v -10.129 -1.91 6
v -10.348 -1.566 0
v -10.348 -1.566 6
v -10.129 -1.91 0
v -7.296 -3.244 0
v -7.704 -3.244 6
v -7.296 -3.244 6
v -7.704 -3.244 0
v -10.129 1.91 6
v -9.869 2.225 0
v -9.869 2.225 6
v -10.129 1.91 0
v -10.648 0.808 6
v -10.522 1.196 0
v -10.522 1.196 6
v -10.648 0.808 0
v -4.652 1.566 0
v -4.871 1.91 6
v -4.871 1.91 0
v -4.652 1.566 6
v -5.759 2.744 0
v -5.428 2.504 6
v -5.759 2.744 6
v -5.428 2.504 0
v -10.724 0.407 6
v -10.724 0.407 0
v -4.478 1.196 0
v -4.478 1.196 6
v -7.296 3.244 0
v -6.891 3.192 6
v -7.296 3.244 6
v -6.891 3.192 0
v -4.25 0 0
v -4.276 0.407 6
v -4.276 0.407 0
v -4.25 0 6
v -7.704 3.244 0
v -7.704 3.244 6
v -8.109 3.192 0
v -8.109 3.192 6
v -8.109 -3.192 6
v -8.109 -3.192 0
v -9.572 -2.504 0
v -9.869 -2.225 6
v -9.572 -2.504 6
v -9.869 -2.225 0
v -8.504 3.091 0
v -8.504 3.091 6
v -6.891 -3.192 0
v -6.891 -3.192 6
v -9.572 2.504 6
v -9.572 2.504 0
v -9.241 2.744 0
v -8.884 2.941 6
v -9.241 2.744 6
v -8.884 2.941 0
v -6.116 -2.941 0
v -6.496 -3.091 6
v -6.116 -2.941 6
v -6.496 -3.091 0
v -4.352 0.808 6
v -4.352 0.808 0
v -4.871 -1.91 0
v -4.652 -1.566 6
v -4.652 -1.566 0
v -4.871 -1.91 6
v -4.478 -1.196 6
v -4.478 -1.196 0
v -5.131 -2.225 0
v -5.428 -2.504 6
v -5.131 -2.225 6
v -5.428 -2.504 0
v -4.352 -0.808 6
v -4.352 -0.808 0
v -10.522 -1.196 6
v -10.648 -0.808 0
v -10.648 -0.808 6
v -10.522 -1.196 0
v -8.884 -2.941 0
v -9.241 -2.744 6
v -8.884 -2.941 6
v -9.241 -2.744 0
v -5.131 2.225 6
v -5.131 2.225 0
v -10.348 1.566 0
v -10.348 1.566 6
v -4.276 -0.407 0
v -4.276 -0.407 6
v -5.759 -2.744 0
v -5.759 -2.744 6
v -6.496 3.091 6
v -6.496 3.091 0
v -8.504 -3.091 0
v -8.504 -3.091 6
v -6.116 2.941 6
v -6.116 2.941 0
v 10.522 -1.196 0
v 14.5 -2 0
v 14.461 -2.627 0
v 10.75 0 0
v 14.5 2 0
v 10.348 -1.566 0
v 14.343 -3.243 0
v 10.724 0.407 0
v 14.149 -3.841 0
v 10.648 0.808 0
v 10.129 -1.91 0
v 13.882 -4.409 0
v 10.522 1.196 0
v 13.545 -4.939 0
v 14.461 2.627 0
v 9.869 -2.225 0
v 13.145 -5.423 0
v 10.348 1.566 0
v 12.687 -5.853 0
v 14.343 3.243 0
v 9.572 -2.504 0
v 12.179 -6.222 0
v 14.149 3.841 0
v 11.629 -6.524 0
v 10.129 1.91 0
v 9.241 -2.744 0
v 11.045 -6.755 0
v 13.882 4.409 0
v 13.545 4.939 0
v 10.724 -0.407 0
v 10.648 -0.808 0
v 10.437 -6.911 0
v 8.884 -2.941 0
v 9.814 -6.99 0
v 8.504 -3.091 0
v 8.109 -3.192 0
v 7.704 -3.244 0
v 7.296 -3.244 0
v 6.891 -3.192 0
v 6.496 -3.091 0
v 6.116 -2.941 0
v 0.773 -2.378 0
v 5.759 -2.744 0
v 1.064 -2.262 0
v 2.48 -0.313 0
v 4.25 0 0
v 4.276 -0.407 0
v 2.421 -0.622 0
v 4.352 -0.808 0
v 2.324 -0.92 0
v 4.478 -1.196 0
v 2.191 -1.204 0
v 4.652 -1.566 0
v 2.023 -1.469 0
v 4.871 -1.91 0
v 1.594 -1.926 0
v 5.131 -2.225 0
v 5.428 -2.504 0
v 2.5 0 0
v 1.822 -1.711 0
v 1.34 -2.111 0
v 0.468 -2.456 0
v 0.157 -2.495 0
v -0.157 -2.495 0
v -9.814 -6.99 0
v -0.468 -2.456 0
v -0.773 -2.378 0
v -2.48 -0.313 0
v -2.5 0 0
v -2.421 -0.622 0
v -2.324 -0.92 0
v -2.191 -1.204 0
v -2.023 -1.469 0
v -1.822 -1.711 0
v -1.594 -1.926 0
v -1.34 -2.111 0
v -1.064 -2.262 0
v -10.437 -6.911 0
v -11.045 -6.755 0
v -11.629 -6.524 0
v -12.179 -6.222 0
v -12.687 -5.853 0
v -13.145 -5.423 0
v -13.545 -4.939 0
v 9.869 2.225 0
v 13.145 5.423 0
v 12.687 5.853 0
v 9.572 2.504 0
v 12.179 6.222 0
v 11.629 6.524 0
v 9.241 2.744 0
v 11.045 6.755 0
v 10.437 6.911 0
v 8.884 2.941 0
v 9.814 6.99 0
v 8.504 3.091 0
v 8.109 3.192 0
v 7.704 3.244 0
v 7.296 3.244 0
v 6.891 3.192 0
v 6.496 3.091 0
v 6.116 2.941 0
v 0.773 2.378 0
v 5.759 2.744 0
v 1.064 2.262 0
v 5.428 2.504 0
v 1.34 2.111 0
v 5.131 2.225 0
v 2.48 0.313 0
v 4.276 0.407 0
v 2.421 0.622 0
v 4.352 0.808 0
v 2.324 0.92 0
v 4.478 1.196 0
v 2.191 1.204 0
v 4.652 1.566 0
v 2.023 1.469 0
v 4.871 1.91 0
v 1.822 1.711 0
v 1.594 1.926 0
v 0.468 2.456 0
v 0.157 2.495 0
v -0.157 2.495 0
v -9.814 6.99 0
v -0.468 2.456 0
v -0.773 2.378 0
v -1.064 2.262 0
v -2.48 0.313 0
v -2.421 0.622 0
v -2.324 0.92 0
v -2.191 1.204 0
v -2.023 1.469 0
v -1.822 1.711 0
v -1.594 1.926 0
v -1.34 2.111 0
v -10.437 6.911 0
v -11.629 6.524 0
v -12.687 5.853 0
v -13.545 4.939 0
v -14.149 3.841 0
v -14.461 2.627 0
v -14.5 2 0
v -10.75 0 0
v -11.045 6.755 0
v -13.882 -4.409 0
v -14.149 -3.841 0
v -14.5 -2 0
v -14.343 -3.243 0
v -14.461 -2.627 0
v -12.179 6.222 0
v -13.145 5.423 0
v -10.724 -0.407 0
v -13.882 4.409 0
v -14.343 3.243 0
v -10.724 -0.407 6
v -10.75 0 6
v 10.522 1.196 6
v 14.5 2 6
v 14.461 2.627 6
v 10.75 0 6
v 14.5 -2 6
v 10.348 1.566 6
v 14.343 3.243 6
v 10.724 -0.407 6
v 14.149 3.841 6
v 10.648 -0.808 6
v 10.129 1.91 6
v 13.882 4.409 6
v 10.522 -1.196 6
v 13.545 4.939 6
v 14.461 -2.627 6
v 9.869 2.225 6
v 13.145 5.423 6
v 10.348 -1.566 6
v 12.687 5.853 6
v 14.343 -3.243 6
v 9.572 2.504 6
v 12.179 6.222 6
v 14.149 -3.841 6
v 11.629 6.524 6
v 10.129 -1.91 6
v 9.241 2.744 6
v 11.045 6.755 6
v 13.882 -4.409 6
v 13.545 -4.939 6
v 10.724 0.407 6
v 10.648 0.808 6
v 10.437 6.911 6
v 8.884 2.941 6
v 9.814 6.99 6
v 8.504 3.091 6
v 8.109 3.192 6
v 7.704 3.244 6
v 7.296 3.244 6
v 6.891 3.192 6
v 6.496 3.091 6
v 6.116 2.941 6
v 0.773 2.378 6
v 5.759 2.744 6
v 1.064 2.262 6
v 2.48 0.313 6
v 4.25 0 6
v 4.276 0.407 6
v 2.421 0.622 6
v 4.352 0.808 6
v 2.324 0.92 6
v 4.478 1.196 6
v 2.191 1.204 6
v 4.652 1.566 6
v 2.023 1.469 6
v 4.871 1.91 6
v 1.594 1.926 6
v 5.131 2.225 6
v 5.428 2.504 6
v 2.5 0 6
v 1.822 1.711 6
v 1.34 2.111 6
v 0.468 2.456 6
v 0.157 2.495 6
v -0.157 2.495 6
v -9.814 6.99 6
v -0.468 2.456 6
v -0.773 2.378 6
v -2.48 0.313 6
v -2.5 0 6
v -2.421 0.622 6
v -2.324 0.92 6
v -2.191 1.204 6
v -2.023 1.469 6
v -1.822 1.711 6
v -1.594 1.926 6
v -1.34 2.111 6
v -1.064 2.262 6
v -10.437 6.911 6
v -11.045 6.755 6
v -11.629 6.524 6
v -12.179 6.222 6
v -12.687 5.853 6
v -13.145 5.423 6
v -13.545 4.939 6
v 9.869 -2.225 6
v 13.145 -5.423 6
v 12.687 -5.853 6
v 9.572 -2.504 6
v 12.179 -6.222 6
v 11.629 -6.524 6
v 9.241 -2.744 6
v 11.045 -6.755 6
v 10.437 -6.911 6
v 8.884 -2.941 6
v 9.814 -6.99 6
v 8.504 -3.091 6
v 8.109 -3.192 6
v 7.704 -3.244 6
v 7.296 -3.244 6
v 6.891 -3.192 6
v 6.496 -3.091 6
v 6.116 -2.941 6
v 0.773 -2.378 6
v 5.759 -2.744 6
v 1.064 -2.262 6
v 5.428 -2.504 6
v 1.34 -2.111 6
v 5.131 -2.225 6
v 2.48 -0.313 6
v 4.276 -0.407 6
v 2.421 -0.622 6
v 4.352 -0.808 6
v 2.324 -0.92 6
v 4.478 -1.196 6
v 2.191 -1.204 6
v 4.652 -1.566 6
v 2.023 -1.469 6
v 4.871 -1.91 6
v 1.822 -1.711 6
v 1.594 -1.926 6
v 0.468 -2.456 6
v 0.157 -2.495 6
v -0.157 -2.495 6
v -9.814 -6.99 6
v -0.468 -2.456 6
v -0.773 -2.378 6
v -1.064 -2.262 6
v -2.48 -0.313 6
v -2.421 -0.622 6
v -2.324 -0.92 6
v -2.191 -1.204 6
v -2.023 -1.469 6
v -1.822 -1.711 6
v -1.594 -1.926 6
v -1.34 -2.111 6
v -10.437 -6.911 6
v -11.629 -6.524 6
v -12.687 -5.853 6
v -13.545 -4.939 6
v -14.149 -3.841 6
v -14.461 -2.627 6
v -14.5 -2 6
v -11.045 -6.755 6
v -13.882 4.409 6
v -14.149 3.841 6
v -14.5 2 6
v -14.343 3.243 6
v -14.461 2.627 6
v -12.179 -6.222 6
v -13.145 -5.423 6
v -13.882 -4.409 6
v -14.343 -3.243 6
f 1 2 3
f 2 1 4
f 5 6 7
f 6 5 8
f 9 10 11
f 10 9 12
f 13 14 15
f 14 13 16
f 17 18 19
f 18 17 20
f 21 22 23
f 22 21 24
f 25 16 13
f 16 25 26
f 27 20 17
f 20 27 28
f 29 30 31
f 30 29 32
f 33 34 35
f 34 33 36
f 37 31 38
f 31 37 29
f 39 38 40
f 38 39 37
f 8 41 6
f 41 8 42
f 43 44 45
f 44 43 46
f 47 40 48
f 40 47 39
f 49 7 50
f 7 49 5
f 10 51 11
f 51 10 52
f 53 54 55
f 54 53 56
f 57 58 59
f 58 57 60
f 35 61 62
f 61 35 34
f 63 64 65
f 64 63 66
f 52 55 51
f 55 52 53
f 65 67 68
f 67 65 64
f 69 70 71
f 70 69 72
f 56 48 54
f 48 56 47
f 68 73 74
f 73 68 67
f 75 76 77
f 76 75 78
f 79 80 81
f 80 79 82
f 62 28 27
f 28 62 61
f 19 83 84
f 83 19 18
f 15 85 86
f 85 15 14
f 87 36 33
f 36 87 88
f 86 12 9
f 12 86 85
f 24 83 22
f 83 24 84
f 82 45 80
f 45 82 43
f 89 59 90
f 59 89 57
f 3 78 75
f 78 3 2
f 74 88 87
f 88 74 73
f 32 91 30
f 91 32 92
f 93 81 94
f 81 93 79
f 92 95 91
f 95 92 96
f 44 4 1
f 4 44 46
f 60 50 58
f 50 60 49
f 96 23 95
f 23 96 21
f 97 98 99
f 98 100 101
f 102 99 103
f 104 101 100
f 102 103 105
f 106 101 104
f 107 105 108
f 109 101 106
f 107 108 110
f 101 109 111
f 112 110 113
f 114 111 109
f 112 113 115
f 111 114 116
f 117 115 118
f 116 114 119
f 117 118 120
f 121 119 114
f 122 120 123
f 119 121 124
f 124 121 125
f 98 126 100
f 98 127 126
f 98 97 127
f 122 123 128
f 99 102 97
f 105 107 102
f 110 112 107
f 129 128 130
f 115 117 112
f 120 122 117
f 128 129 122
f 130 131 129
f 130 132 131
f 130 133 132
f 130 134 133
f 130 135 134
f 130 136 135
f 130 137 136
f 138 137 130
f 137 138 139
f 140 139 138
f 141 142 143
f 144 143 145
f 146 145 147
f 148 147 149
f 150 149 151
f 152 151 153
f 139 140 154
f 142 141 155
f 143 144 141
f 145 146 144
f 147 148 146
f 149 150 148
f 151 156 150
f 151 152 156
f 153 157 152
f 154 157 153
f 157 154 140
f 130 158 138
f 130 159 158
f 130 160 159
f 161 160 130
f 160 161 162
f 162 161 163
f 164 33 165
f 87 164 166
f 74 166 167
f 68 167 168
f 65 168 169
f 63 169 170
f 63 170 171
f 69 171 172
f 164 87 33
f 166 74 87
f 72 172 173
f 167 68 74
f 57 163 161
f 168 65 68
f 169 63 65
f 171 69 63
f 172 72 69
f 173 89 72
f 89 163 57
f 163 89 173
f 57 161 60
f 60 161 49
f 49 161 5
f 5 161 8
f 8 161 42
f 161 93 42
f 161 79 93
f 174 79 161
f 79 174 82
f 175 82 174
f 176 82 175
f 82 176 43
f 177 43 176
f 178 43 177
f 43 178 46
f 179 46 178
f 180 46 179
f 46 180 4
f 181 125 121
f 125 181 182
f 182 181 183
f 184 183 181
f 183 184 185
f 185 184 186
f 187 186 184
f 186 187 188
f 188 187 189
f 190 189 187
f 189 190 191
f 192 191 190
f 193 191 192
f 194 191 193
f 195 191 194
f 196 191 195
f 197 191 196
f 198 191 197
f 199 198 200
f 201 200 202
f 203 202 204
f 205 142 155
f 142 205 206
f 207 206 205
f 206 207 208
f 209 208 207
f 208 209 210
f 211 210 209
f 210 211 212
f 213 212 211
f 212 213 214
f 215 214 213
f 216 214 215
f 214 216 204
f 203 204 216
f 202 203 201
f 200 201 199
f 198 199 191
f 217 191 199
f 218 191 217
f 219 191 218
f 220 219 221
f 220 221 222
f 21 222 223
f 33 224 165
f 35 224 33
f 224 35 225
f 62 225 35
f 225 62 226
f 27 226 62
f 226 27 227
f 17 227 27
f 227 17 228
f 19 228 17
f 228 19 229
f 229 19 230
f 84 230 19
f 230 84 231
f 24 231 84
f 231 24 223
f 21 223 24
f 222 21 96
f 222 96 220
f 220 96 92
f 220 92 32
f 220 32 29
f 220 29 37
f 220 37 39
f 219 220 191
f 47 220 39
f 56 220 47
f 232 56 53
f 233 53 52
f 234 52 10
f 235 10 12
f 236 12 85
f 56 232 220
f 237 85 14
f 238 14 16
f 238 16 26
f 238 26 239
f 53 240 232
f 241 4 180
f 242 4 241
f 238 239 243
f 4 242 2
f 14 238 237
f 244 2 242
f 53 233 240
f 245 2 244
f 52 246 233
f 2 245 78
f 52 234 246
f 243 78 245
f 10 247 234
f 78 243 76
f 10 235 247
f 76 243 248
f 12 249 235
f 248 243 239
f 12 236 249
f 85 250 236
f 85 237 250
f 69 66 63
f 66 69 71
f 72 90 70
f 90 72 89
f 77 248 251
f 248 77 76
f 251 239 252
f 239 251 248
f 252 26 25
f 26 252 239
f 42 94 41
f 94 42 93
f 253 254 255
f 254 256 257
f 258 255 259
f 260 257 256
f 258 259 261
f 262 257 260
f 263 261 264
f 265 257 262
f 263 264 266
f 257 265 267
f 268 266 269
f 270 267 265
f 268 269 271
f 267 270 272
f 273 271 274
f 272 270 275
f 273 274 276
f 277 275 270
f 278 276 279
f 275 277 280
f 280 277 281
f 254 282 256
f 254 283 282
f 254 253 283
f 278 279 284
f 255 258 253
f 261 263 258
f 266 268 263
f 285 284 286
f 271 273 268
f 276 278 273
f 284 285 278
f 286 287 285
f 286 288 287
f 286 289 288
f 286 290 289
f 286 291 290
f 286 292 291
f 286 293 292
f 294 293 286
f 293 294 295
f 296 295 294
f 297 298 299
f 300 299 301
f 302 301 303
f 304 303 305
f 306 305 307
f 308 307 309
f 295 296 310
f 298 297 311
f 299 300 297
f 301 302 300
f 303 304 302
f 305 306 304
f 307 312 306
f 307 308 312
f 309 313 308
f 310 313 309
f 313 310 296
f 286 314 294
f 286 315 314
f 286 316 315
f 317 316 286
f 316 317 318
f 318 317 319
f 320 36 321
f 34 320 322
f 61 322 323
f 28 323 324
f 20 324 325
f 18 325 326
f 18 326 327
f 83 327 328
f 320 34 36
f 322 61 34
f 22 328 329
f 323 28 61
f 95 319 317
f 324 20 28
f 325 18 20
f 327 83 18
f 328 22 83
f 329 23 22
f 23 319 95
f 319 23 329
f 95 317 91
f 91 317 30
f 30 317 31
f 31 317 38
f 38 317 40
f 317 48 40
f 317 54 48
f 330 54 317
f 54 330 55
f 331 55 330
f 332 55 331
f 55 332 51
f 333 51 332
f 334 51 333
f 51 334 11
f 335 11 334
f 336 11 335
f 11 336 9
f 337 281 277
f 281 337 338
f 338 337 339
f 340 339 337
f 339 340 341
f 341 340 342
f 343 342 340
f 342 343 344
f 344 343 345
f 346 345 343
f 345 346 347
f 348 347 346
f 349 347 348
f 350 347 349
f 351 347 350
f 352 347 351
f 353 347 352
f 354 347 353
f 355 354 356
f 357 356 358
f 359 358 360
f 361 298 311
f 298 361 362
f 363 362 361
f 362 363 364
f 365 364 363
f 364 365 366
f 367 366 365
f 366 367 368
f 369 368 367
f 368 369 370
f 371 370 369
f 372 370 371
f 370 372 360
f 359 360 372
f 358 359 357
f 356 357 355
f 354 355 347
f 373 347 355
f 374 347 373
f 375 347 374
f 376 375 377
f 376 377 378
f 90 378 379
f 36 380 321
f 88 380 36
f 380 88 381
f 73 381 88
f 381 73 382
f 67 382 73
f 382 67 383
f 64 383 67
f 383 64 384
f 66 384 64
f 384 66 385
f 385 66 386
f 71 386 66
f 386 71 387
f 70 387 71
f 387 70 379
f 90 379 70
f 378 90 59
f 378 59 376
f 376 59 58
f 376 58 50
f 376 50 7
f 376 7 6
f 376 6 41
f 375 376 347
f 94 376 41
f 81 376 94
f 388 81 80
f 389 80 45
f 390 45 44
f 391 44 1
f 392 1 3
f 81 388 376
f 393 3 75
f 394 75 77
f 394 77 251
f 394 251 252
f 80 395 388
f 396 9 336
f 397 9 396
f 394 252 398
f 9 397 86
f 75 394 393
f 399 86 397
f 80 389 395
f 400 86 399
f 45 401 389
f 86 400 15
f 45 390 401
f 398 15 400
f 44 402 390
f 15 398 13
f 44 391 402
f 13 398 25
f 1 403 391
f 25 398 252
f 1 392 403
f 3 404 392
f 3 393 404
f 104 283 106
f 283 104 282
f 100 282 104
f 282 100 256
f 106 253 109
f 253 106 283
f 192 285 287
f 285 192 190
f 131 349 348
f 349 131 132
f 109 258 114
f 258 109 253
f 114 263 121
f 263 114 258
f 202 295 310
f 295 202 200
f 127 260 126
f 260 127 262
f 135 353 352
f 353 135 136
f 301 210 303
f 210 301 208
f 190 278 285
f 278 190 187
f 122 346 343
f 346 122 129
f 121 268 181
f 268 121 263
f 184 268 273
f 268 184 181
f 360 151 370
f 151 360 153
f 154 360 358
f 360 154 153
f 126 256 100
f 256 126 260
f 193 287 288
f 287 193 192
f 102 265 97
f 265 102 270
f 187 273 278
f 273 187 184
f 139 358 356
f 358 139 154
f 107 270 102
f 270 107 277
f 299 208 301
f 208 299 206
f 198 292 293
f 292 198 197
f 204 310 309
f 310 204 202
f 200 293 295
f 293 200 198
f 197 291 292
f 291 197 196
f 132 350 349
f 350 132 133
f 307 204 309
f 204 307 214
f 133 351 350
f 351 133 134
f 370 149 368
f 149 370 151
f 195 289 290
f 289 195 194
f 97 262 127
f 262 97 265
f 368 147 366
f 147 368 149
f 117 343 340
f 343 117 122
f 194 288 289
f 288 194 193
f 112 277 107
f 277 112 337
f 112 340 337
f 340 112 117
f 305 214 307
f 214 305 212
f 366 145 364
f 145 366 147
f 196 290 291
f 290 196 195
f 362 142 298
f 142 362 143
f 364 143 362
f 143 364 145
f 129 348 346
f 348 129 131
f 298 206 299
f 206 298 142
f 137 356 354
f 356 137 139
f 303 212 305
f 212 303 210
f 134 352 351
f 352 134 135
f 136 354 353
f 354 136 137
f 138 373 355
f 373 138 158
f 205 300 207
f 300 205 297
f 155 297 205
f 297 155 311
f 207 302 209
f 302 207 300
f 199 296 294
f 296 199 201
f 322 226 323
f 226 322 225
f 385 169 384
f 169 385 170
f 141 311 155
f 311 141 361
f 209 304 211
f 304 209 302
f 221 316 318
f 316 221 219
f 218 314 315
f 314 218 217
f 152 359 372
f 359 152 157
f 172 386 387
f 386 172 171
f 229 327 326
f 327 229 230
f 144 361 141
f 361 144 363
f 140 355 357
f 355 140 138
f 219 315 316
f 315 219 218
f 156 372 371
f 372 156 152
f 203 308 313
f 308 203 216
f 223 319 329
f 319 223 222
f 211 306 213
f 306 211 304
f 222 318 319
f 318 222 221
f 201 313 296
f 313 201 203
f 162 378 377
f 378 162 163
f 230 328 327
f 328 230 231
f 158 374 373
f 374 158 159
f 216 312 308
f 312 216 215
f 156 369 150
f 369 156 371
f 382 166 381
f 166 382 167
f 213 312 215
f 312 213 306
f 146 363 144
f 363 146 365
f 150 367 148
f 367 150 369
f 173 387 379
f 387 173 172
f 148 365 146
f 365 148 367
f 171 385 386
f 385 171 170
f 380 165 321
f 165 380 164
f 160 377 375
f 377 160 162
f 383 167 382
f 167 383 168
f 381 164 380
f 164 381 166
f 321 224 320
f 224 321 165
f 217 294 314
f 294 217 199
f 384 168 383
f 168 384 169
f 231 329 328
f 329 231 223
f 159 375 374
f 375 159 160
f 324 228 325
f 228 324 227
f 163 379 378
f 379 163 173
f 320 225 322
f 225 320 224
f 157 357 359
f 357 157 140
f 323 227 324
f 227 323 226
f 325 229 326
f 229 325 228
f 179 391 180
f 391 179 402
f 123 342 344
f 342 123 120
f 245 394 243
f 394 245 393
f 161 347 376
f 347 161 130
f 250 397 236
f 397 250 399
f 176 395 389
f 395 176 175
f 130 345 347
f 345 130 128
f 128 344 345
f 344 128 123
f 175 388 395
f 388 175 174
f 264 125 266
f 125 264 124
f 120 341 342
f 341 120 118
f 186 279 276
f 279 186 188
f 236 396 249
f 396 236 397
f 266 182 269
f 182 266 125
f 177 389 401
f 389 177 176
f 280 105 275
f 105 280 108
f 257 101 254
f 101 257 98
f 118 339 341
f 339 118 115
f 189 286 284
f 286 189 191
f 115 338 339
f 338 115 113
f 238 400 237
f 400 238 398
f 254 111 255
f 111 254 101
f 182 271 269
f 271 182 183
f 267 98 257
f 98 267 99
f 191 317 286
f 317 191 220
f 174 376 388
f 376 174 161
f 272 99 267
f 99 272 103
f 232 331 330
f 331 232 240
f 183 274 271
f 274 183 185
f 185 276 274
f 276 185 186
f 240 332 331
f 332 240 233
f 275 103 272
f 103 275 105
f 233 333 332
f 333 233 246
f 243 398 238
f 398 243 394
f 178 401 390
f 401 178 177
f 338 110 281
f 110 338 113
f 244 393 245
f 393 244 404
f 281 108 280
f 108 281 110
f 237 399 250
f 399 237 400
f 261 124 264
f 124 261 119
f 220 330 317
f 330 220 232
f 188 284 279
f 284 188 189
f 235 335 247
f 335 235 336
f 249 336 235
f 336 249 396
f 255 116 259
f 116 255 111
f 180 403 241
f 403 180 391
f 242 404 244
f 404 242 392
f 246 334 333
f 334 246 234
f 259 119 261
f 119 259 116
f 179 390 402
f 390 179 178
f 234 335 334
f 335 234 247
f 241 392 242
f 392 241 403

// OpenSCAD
$fn = 50;

difference() {
	union() {
		hull() {
			translate(v = [-9.5, 2.0, 0]) {
				cylinder(h = 6, r = 5);
			}
			translate(v = [9.5, 2.0, 0]) {
				cylinder(h = 6, r = 5);
			}
			translate(v = [-9.5, -2.0, 0]) {
				cylinder(h = 6, r = 5);
			}
			translate(v = [9.5, -2.0, 0]) {
				cylinder(h = 6, r = 5);
			}
		}
	}
	union() {
		translate(v = [-7.5, 0.0, 0]) {
			cylinder(h = 6, r = 3.25);
		}
		translate(v = [7.5, 0.0, 0]) {
			cylinder(h = 6, r = 3.25);
		}
		cylinder(h = 6, r = 2.5);
	}
}
